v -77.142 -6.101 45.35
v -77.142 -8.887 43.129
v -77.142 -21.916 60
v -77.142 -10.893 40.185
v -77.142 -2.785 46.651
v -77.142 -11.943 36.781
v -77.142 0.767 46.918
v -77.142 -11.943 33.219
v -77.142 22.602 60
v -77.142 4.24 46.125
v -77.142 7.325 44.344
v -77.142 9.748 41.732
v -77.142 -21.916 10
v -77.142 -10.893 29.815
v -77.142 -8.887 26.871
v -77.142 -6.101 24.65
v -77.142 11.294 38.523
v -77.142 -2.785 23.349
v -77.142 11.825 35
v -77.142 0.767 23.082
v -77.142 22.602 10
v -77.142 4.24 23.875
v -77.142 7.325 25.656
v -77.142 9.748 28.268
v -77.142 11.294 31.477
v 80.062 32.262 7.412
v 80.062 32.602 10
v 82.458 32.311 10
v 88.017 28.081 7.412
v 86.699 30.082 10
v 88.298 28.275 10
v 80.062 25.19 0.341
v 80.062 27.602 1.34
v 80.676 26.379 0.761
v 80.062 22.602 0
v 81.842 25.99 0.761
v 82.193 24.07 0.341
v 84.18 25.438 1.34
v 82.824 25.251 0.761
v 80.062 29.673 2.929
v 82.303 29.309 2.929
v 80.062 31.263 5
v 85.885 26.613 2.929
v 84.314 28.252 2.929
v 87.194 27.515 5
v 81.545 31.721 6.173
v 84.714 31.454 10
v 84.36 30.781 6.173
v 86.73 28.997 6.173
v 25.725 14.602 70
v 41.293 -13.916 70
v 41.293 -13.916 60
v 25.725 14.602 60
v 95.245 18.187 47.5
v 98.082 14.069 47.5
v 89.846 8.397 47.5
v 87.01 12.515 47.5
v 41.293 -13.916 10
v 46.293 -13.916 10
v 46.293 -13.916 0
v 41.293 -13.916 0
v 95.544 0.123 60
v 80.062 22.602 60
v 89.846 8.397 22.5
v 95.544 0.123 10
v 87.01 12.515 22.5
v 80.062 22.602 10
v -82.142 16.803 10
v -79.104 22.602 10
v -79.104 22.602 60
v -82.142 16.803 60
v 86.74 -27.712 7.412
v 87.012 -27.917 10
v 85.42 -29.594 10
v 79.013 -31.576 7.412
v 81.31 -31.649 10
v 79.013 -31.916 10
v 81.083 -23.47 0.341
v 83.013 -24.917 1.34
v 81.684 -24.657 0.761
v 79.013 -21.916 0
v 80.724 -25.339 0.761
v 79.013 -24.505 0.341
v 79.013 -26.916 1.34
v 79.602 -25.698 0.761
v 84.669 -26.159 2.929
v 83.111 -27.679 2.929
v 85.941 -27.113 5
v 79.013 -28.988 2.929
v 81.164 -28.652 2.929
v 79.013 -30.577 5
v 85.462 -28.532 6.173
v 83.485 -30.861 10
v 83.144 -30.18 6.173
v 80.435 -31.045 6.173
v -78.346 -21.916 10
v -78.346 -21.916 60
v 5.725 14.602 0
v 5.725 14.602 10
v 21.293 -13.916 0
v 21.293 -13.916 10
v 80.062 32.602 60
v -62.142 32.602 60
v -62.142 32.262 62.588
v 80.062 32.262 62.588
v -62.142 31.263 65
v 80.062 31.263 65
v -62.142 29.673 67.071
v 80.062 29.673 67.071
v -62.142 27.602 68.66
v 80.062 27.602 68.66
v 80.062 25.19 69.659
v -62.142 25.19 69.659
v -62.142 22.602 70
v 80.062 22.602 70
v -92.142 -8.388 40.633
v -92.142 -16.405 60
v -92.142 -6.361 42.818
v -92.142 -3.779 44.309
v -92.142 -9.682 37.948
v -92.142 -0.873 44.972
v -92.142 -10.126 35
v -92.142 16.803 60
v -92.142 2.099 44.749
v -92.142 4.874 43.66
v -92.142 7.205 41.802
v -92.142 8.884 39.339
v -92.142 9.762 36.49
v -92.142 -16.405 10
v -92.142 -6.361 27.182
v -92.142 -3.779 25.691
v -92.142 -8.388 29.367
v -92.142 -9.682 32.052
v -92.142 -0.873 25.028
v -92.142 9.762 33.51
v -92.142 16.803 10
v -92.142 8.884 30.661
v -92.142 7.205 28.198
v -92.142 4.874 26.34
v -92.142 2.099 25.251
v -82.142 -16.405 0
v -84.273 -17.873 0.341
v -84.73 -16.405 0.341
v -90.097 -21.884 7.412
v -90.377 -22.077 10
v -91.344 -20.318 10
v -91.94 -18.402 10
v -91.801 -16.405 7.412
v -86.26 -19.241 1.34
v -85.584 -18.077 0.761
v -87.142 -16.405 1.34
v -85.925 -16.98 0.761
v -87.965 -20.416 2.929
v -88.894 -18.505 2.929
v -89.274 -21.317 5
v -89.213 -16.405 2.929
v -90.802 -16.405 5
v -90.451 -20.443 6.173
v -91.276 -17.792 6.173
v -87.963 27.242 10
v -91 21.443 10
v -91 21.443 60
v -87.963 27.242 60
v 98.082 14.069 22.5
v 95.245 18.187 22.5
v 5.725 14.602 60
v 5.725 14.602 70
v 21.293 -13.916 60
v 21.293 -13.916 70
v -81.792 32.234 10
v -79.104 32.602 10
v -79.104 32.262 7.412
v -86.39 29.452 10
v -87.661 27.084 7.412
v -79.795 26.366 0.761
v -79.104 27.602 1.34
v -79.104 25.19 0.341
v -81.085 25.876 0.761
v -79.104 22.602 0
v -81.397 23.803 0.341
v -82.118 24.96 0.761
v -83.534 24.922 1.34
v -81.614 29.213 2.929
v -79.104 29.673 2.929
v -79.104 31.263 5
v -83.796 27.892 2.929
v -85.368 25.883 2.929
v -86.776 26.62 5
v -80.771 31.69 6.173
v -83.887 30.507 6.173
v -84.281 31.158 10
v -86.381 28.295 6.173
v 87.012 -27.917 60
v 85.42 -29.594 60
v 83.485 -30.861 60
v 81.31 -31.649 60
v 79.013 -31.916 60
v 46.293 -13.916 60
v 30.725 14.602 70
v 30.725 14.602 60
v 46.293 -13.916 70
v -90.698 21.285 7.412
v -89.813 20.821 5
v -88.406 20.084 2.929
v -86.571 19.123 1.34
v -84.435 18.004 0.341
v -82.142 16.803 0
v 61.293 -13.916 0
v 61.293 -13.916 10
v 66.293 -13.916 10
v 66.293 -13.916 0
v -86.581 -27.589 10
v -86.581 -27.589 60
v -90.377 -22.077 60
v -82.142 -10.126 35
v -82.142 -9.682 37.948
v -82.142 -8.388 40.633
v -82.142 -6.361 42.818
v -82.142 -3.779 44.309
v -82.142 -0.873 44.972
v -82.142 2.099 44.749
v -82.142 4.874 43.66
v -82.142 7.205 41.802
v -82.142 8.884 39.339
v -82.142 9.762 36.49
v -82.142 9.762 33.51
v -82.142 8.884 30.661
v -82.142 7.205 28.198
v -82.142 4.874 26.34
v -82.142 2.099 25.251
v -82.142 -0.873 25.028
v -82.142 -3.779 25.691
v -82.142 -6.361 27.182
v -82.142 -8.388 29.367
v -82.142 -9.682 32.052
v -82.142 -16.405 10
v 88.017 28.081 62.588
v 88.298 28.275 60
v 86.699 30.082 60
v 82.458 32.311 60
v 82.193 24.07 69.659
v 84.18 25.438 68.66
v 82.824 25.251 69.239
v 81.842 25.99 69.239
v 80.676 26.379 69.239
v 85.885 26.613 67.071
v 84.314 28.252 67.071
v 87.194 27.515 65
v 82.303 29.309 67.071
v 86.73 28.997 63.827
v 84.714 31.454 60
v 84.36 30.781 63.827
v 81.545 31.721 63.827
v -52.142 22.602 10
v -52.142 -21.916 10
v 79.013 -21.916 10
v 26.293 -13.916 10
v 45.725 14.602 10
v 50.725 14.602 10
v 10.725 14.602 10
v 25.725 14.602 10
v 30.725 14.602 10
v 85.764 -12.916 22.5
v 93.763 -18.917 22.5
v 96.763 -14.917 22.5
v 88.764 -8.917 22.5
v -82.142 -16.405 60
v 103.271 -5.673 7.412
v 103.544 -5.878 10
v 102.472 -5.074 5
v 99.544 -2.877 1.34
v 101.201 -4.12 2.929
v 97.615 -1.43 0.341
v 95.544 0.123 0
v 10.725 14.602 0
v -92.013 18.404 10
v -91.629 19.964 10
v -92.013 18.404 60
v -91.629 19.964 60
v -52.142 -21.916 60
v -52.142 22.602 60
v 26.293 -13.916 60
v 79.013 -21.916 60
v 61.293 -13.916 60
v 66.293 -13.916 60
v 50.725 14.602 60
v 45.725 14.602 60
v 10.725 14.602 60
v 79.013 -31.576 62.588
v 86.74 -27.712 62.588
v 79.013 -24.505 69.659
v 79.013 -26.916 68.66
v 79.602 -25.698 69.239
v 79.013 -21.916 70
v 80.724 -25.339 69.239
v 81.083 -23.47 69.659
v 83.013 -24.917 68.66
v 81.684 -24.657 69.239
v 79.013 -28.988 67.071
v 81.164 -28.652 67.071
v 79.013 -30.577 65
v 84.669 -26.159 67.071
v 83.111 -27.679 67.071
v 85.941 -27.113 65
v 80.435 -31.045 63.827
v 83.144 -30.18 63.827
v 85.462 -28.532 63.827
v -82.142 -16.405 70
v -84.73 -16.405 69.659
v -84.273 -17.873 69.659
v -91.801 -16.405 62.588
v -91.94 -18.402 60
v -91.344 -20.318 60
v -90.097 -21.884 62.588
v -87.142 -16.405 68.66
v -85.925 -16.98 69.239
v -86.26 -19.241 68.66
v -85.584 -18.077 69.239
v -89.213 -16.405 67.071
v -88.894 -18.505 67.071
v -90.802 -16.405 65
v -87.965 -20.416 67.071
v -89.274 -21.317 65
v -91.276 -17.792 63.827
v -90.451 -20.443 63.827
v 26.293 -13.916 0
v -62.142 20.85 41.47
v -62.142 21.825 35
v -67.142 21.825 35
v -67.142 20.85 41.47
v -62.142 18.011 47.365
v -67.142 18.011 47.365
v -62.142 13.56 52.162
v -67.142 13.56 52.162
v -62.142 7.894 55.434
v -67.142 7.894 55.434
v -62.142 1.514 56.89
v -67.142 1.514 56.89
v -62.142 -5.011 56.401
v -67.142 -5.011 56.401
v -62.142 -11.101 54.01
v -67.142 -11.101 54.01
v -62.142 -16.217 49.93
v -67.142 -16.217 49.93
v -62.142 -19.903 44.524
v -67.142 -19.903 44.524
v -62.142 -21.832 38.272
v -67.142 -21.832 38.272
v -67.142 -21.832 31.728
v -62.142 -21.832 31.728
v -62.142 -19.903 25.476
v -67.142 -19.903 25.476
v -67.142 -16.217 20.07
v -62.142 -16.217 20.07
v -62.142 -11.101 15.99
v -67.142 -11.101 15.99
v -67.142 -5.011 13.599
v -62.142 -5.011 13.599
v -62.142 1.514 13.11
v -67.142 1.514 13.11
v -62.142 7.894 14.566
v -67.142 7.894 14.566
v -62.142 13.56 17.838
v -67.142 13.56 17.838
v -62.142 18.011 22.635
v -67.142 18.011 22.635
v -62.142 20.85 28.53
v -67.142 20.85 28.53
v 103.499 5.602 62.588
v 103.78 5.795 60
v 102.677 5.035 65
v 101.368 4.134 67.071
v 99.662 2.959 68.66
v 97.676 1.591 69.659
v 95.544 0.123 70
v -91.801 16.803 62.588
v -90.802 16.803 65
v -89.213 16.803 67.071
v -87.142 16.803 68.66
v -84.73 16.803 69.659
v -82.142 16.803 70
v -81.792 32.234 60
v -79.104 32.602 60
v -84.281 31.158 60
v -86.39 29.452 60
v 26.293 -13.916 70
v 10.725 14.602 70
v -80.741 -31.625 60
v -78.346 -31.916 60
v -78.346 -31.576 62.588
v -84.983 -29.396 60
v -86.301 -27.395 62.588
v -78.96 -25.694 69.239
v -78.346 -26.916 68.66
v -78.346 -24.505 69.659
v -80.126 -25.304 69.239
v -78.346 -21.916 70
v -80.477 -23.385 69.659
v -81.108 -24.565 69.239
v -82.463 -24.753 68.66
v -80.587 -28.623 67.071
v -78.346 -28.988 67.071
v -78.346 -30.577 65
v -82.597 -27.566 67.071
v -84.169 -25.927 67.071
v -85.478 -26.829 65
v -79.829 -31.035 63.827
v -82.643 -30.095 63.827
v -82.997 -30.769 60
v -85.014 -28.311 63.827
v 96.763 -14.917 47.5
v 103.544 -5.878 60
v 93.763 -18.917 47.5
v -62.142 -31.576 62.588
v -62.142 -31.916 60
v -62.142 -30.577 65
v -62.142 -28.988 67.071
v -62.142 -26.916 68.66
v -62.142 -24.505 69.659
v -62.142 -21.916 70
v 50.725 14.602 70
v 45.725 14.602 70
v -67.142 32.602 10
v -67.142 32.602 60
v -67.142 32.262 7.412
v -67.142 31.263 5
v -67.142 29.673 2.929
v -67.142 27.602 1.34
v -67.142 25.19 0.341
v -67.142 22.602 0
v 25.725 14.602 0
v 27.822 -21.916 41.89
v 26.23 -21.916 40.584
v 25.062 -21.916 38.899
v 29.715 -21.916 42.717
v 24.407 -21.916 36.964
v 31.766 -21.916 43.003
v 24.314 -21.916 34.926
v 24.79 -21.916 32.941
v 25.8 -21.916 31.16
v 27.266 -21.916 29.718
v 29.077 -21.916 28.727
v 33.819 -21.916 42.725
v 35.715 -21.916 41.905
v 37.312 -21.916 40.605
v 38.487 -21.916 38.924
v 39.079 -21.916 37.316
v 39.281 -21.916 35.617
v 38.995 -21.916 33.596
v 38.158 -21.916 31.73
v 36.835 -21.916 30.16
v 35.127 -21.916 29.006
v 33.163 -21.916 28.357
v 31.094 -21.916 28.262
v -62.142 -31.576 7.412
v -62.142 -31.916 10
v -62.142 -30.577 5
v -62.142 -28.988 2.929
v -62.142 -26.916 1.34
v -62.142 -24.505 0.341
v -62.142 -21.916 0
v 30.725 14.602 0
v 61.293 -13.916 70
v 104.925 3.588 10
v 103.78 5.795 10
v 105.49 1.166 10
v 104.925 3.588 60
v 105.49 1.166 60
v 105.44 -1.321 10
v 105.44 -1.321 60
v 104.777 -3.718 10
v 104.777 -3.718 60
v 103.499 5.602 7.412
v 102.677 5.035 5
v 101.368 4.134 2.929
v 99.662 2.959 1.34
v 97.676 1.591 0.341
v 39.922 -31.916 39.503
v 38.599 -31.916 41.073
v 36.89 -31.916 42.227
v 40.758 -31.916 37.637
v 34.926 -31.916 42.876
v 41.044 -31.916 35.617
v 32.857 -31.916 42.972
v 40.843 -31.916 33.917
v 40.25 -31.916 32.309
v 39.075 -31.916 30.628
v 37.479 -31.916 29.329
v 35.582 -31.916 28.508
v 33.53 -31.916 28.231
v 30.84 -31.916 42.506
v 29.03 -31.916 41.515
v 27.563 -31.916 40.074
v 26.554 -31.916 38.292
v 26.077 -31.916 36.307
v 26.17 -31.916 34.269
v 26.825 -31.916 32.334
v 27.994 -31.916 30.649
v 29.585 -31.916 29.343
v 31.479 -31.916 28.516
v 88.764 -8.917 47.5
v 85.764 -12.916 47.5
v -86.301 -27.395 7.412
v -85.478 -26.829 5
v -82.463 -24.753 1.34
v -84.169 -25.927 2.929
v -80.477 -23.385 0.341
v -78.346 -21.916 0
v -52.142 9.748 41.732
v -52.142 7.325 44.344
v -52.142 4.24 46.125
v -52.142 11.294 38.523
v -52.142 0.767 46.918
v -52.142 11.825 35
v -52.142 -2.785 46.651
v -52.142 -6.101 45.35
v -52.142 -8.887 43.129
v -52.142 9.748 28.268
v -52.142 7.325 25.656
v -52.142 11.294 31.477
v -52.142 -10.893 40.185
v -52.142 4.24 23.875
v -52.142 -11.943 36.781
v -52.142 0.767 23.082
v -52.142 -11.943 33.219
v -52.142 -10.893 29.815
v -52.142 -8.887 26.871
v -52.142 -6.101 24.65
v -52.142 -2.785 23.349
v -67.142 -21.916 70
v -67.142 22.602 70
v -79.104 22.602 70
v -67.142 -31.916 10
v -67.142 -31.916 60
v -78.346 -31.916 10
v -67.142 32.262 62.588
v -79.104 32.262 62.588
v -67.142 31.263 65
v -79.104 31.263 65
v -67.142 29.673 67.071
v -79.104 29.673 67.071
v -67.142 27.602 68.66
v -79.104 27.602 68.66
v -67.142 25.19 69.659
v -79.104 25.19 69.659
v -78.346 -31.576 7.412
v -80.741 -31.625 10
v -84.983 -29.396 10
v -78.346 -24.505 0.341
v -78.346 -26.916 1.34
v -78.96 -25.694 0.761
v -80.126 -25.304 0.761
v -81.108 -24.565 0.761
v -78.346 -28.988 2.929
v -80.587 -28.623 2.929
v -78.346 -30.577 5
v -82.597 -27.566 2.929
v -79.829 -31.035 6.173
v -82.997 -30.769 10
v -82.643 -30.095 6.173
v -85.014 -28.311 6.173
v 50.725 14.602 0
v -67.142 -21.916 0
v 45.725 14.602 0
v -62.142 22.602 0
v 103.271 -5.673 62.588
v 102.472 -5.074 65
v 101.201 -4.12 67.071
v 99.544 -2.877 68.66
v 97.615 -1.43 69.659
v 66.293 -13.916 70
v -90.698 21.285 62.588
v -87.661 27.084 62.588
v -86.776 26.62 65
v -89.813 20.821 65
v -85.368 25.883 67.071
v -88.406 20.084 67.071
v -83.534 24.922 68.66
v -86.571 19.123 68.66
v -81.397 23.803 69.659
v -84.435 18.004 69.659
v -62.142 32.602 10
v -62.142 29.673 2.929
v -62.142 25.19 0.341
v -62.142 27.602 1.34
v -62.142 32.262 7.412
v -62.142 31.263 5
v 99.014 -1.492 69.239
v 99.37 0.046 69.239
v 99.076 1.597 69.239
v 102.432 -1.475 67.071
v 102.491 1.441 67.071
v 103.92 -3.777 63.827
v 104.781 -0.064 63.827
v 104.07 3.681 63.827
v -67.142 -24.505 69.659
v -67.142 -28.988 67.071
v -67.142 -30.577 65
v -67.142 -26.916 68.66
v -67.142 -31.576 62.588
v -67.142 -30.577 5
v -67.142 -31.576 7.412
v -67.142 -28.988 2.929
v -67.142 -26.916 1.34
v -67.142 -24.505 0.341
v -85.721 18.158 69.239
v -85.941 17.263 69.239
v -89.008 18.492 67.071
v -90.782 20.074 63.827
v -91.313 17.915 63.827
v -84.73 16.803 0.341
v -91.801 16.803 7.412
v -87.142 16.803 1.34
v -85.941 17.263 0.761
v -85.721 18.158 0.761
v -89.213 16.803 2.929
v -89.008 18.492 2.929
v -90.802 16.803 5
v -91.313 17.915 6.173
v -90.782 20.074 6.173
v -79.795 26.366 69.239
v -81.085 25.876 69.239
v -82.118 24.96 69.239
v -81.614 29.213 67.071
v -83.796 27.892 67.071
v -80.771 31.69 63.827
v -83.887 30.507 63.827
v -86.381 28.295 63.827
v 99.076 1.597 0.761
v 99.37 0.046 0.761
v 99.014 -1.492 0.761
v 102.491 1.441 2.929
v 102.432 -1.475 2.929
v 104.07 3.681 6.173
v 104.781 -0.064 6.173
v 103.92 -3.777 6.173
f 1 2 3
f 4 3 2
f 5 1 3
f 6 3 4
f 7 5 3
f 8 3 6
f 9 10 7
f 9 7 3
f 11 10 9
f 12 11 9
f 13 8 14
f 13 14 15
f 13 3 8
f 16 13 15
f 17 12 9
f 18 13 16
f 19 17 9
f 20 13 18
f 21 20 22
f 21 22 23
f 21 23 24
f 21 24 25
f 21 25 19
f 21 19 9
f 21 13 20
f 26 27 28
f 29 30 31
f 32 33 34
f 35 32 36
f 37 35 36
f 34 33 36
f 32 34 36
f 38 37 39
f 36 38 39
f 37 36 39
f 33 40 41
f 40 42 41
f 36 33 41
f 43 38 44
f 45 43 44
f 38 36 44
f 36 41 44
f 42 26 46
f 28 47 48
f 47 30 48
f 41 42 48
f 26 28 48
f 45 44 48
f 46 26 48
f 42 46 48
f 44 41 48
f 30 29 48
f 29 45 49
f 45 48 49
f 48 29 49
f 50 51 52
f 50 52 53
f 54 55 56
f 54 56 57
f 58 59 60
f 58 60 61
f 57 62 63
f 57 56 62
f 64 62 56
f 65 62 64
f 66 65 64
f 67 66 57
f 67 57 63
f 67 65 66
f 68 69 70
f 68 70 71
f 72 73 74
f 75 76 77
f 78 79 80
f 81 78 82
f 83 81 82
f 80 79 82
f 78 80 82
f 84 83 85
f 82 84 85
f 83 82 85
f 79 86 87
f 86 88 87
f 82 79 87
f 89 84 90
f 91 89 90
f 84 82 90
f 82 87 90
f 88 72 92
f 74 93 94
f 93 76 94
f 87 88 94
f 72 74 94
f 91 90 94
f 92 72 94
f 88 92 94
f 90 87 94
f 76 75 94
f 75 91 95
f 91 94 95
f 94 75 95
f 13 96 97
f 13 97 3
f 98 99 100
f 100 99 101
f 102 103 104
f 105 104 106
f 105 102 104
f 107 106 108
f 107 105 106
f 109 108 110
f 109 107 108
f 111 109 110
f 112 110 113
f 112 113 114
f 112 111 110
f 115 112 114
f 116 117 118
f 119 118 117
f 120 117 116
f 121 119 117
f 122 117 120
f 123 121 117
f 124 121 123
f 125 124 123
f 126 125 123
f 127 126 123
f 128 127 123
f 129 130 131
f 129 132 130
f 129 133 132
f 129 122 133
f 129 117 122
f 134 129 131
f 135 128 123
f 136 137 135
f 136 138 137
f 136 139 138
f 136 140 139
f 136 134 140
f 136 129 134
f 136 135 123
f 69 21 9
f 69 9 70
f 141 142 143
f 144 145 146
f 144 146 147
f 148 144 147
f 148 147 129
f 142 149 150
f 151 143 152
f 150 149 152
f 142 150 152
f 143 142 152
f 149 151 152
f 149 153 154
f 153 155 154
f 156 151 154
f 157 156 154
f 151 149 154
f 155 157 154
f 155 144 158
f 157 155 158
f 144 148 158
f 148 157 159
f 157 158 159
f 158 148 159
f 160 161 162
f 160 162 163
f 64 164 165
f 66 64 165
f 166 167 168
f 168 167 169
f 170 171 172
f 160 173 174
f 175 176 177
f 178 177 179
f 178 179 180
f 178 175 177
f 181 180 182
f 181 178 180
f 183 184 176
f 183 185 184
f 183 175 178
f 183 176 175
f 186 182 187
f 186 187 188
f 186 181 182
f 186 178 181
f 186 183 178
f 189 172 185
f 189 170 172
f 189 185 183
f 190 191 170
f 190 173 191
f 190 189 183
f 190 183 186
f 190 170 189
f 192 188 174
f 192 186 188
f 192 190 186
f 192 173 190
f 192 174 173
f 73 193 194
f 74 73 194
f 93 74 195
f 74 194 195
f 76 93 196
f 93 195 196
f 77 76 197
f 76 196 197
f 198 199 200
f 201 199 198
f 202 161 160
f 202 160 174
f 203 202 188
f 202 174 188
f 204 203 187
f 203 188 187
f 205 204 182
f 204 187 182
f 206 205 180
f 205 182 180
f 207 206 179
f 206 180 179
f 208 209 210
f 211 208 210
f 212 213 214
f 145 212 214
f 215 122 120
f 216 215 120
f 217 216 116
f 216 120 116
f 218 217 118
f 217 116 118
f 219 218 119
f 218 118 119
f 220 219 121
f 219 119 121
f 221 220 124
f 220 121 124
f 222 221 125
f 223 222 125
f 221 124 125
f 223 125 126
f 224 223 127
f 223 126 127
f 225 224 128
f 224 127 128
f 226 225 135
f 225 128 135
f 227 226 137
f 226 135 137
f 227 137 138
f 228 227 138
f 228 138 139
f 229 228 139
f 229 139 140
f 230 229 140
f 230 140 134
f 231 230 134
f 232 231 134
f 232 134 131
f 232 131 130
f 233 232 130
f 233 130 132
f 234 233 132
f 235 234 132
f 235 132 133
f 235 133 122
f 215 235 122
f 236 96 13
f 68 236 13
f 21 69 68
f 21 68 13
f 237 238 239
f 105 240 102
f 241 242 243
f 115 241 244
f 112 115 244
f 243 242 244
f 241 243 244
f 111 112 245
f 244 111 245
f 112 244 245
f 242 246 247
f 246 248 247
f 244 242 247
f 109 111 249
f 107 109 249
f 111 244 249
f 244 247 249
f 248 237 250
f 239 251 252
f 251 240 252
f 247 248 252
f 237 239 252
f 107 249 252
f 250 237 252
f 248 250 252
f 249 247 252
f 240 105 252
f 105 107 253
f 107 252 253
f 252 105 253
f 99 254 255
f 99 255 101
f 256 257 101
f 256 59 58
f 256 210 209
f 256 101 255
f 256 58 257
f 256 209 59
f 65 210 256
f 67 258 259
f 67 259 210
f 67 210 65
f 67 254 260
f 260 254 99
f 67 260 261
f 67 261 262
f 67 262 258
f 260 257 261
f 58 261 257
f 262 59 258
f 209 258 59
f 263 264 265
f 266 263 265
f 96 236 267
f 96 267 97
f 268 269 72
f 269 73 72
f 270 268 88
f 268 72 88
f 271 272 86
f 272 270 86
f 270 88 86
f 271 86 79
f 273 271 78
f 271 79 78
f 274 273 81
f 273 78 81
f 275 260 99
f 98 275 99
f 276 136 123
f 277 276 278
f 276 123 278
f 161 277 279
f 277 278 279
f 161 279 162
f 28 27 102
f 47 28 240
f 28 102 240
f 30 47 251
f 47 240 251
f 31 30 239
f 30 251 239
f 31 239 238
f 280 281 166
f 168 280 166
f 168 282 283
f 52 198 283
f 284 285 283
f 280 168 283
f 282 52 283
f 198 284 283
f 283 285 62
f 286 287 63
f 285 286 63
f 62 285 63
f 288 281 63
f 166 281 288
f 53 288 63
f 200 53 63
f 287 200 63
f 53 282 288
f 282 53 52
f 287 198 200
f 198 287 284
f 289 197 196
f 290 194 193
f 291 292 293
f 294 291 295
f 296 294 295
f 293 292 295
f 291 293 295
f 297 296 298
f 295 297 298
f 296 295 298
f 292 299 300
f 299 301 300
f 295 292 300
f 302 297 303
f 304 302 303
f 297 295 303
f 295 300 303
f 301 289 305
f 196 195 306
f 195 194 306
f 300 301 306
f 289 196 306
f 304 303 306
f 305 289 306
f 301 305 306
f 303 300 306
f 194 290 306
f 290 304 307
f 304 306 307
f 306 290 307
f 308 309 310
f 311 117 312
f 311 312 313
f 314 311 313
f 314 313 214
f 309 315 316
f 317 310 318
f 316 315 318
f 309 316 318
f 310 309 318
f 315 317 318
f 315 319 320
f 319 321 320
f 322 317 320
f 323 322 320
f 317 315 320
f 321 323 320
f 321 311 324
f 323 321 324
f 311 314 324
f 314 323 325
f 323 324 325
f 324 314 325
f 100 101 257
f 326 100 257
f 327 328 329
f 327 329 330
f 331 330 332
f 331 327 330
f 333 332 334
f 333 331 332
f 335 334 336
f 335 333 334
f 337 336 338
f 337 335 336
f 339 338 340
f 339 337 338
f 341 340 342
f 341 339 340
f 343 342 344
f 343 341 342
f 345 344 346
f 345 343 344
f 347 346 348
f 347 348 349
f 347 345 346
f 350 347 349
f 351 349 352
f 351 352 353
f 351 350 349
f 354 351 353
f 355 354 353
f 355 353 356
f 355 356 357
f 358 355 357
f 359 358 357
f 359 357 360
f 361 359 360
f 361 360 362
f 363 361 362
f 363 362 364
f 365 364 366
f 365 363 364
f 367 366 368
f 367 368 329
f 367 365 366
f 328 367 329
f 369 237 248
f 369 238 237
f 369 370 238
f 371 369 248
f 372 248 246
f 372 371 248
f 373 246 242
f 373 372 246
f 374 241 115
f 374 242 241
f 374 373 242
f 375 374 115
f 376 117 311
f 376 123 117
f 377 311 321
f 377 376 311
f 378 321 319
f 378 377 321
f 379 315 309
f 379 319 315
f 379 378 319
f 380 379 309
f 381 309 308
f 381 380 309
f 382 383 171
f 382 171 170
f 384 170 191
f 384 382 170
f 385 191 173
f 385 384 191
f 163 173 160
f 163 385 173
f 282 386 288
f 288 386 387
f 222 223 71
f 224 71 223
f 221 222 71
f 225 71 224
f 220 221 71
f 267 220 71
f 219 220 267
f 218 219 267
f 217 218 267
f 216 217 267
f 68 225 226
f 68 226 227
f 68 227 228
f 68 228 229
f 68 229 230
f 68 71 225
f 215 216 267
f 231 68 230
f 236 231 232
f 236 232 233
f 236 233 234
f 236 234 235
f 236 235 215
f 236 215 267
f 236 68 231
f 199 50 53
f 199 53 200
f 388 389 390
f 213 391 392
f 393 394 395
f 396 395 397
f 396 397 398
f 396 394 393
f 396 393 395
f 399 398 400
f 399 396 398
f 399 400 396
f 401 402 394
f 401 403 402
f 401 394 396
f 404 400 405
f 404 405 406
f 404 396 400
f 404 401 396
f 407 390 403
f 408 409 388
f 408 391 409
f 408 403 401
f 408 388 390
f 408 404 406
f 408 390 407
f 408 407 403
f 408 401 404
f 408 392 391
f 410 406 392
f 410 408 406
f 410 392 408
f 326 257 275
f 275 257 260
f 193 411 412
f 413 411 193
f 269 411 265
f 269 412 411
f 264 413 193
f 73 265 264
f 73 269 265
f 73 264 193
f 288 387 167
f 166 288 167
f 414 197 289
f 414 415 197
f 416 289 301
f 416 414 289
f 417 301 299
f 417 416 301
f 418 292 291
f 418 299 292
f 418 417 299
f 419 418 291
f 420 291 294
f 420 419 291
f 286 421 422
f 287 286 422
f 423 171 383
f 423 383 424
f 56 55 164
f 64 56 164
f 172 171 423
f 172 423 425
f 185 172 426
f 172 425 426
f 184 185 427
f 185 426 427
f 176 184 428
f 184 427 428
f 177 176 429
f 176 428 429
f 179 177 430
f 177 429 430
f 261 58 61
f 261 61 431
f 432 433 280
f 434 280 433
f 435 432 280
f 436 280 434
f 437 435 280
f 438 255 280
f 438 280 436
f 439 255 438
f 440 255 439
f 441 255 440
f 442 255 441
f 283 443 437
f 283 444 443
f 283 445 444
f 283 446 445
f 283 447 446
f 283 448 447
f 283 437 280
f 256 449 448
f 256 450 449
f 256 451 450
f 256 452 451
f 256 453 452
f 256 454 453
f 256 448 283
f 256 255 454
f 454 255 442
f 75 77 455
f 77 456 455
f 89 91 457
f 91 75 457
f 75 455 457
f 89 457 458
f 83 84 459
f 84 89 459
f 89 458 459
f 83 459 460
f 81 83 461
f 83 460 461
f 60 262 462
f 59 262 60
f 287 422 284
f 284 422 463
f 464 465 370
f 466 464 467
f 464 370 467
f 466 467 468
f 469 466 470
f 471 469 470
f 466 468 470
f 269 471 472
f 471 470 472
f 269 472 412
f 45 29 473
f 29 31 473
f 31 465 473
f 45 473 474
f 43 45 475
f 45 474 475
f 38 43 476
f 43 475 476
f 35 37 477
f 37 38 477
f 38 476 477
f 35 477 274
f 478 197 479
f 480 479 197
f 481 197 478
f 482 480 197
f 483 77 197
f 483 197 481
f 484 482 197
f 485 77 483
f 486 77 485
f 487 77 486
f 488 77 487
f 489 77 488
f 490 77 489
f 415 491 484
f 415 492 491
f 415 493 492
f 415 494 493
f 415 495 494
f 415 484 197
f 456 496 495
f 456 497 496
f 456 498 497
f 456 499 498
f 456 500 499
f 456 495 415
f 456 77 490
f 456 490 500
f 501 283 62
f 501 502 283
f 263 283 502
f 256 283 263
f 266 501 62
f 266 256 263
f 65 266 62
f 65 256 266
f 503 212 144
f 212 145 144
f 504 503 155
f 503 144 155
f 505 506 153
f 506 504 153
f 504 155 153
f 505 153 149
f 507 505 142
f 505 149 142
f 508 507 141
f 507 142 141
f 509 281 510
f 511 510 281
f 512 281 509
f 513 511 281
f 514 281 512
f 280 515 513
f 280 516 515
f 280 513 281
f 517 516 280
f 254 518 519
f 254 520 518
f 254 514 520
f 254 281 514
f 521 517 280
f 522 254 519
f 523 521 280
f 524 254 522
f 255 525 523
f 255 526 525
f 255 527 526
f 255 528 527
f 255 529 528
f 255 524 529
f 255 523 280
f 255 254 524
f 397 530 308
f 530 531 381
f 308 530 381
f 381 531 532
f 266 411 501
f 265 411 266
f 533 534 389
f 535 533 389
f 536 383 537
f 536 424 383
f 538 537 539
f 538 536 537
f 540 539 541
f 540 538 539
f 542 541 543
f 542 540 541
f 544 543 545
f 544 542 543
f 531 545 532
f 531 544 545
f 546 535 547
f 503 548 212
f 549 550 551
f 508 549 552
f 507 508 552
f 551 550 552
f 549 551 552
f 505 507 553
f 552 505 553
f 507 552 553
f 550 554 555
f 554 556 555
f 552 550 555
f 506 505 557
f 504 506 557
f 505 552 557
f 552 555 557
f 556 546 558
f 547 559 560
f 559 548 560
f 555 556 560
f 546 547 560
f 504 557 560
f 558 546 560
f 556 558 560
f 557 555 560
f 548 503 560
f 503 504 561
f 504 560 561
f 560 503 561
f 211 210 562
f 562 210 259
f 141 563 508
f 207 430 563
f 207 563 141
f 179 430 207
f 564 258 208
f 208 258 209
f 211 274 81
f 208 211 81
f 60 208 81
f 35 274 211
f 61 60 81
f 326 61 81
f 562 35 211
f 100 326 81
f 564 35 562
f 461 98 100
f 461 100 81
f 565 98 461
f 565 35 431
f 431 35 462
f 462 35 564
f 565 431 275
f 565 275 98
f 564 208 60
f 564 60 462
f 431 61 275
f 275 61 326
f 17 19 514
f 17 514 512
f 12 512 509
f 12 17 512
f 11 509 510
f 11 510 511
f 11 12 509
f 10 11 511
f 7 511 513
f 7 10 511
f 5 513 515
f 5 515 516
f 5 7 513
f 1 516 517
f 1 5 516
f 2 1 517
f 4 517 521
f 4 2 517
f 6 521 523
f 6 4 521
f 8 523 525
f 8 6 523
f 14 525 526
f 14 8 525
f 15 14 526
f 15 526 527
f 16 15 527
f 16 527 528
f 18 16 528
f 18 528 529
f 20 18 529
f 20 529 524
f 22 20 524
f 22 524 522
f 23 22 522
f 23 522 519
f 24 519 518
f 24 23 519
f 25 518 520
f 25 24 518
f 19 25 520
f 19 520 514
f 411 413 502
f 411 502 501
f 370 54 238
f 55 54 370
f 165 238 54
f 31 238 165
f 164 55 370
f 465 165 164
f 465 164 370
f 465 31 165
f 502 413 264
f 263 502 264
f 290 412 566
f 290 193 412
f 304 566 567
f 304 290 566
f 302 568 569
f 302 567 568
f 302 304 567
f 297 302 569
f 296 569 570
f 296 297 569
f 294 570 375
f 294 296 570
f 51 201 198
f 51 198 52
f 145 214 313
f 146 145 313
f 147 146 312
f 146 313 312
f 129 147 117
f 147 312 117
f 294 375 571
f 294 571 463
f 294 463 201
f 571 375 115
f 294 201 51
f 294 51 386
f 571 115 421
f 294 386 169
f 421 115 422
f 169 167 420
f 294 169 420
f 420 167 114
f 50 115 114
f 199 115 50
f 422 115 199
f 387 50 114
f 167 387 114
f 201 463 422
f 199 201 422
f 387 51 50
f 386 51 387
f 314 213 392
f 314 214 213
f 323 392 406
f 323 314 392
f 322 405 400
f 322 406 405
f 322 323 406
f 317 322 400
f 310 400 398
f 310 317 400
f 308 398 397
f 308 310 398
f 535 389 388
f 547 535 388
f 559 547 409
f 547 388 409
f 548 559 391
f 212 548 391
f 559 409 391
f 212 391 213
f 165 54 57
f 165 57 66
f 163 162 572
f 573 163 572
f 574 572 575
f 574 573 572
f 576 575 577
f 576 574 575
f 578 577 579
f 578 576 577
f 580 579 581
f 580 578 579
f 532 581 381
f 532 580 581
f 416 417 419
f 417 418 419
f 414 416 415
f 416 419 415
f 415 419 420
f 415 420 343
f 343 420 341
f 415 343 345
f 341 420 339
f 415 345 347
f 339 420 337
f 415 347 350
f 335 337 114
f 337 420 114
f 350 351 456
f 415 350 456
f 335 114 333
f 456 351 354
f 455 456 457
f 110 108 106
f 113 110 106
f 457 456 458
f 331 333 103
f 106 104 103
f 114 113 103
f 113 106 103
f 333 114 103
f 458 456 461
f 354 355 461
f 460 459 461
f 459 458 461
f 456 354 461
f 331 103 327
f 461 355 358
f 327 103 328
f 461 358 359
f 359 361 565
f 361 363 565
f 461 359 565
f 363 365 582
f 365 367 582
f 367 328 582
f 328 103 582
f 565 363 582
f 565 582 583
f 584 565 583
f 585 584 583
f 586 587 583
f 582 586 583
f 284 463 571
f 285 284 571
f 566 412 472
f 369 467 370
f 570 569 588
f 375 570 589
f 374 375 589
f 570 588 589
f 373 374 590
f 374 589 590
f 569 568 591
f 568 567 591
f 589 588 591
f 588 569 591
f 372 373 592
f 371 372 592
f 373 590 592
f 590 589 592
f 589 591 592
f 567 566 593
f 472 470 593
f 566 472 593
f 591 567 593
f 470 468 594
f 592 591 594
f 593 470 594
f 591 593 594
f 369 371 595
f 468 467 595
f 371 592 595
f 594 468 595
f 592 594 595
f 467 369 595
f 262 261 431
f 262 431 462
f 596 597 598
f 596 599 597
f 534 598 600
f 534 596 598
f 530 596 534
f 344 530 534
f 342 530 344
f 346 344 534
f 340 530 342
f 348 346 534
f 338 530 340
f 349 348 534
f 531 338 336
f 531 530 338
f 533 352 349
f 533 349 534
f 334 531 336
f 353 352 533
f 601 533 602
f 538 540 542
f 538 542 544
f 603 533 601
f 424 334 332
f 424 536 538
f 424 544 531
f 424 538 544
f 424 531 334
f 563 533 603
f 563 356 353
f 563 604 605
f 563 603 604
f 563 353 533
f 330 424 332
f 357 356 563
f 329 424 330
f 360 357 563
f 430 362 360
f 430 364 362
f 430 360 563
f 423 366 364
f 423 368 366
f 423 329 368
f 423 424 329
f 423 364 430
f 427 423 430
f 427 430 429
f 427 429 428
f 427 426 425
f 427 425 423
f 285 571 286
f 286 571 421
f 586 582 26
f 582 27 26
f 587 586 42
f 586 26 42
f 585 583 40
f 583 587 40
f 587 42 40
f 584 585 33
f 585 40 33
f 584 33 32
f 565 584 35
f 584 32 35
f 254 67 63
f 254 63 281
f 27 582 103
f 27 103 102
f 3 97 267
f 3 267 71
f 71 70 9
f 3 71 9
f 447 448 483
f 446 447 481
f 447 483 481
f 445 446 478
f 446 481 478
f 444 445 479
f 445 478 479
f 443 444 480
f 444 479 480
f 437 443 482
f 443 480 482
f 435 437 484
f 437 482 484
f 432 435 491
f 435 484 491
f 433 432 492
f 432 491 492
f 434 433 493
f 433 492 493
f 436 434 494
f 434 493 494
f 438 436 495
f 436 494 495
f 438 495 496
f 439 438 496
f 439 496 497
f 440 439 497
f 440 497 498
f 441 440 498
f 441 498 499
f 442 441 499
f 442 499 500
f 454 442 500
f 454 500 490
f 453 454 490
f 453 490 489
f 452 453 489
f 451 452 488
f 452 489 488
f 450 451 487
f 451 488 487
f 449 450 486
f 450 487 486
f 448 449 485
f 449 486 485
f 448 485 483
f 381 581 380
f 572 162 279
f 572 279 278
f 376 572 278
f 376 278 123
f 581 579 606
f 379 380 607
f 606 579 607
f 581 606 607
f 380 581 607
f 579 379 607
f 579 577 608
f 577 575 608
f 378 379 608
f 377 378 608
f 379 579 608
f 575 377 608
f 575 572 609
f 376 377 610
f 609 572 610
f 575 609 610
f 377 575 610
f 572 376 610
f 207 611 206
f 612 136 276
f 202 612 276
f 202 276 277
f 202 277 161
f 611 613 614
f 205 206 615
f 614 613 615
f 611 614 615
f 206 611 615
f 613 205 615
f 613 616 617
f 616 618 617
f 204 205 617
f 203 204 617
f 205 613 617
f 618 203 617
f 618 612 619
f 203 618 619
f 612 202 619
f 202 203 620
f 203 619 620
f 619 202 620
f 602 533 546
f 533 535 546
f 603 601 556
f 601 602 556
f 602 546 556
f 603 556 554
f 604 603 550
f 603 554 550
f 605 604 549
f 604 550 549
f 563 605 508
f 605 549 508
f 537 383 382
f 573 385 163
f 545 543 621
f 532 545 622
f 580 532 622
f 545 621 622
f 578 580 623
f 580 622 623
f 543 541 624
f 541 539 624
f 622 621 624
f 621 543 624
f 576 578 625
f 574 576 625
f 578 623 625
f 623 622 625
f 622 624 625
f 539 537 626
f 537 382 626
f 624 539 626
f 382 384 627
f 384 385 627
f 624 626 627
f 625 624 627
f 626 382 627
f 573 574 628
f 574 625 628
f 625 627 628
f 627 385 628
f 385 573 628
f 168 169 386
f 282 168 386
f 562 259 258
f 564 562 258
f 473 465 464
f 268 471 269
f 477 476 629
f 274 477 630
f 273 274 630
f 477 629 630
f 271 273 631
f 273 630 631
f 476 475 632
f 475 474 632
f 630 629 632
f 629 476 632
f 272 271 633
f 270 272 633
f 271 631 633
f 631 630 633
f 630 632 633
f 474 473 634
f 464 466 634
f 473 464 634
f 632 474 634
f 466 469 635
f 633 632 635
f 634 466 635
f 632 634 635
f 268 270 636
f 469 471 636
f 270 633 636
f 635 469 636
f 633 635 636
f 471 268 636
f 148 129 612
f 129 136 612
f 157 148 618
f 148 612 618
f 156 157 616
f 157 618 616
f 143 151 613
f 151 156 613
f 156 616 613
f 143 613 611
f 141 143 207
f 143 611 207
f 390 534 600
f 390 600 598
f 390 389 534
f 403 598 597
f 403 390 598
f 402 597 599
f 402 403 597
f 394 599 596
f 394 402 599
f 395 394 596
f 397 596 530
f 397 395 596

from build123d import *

# Parameters (mm, degrees)
BOSS_EXTRUDE1_DEPTH = 70
FILLET1_R           = 10
SKETCH4_R           = 44.565838739
SKETCH4_R_2         = 21.950927137
CUT_EXTRUDE18_DEPTH = 5
SHELL2_START        = 10
SHELL2_DEPTH        = 50
SHELL2_START_2      = -77.141831355
SHELL2_2_OUTLINE_R  = 11.950927137
SHELL2_2_DEPTH      = 25
SKETCH2_R           = 10
CUT_EXTRUDE19_DEPTH = 30
SKETCH10_R          = 7.386058148
CUT_EXTRUDE22_DEPTH = 33
CUT_EXTRUDE23_DEPTH = 131.776604246
SKETCH16_W          = 25
SKETCH16_H          = 5
CUT_EXTRUDE25_DEPTH = 16.122153735
SKETCH17_W          = 25
SKETCH17_H          = 5
CUT_EXTRUDE26_DEPTH = 16.122153735


with BuildPart() as part:
    # Sketch1 → Boss-Extrude1 (new body)
    with BuildSketch(Plane.XY):
        Polygon((-85.15522278, 32.602281584), (85.31682344, 32.602281584), (107.858168645, -0.126017705), (84.012402994, -31.916476628), (-83.600577489, -31.916476628), (-92.141831355, -19.515233034), (-92.141831355, 19.263197625), align=None)
    extrude(amount=BOSS_EXTRUDE1_DEPTH)

    # Fillet1
    fillet1_edges = [part.edges().sort_by_distance(p)[0] for p in [
        (-88.648527067, 25.932739604, 0),
        (-85.15522278, 32.602281584, 35),
        (85.31682344, 32.602281584, 35),
        (107.858168645, -0.126017705, 35),
        (-87.871204422, -25.715854831, 70),
        (84.012402994, -31.916476628, 35),
        (-83.600577489, -31.916476628, 35),
        (-92.141831355, -19.515233034, 35),
        (-92.141831355, 19.263197625, 35),
        (0.205912752, -31.916476628, 70),
        (95.93528582, -16.021247166, 70),
        (96.587496042, 16.23813194, 70),
        (0.08080033, 32.602281584, 70),
        (-88.648527067, 25.932739604, 70),
        (0.08080033, 32.602281584, 0),
        (96.587496042, 16.23813194, 0),
        (95.93528582, -16.021247166, 0),
        (0.205912752, -31.916476628, 0),
        (-92.141831355, -0.126017705, 70),
        (-87.871204422, -25.715854831, 0),
        (-92.141831355, -0.126017705, 0),
    ]]
    fillet(fillet1_edges, radius=FILLET1_R)

    # Sketch4 → Cut-Extrude18 (cut)
    with BuildSketch(Plane(origin=(-62.141831355, 0, 0), x_dir=(0, 0, -1), z_dir=(1, 0, 0))):
        with Locations((-35, -0.126017705)):
            Circle(SKETCH4_R)
        with Locations(Location((-35, -0.126017705, 0), (0, 0, 90))):
            Circle(SKETCH4_R_2, mode=Mode.SUBTRACT)
    extrude(amount=-CUT_EXTRUDE18_DEPTH, mode=Mode.SUBTRACT)

    # Shell2: read off the stored shape, not the designer's step
    # Shell2 outline → Shell2 (cut)
    with BuildSketch(Plane.XY.offset(SHELL2_START)):
        Polygon((-78.345650785, -21.916476628), (-77.141831355, -21.916476628), (-77.141831355, 22.602281584), (-79.104276607, 22.602281584), (-82.141831355, 16.80287299), (-82.141831355, -16.404714454), align=None)
        Polygon((-52.141831355, -21.916476628), (79.012770562, -21.916476628), (95.544357754, 0.122939143), (80.061896735, 22.602281584), (-52.141831355, 22.602281584), align=None)
    extrude(amount=SHELL2_DEPTH, mode=Mode.SUBTRACT)

    # Shell2 2 outline → Shell2 2 (cut)
    with BuildSketch(Plane.YZ.offset(SHELL2_START_2)):
        with Locations((-0.126017705, 35)):
            Circle(SHELL2_2_OUTLINE_R)
    extrude(amount=SHELL2_2_DEPTH, mode=Mode.SUBTRACT)

    # Sketch2 → Cut-Extrude19 (cut)
    with BuildSketch(Plane.ZY.offset(92.141831355)):
        with Locations(Location((35, -0.126017705, 0), (0, 0, 270))):
            Circle(SKETCH2_R)
    extrude(amount=-CUT_EXTRUDE19_DEPTH, mode=Mode.SUBTRACT)

    # Sketch10 → Cut-Extrude22 (cut)
    with BuildSketch(Plane(origin=(7.840565514, -44.466056654, 0), x_dir=(0, 0, 1), z_dir=(0.17364817766693072, -0.984807753012208, 0))):
        with Locations(Location((35.616590305, -27.492158059, 0), (0, 0, 270))):
            Circle(SKETCH10_R)
    extrude(amount=-CUT_EXTRUDE22_DEPTH, mode=Mode.SUBTRACT)

    # Sketch11 → Cut-Extrude23 (cut, through all)
    with BuildSketch(Plane.XY.offset(70)):
        Polygon((25.724647203, 14.602281584), (30.724647203, 14.602281584), (46.292543401, -13.916476628), (41.292543401, -13.916476628), align=None)
        Polygon((21.292543401, -13.916476628), (26.292543401, -13.916476628), (10.724647203, 14.602281584), (5.724647203, 14.602281584), align=None)
        Polygon((45.724647203, 14.602281584), (61.292543401, -13.916476628), (66.292543401, -13.916476628), (50.724647203, 14.602281584), align=None)
    extrude(amount=-CUT_EXTRUDE23_DEPTH, mode=Mode.SUBTRACT)

    # Sketch16 → Cut-Extrude25 (cut)
    with BuildSketch(Plane(origin=(73.09679987, 50.344815805, 0), x_dir=(0, 0, -1), z_dir=(0.8235642198480575, 0.5672230388357482, 0))):
        with Locations((-35, -41.547421266)):
            Rectangle(SKETCH16_W, SKETCH16_H)
    extrude(amount=-CUT_EXTRUDE25_DEPTH, mode=Mode.SUBTRACT)

    # Sketch17 → Cut-Extrude26 (cut)
    with BuildSketch(Plane(origin=(69.08362881, -51.819070211, 0), x_dir=(0, 0, -1), z_dir=(0.7999647115864142, -0.600047048335766, 0))):
        with Locations((-35, 43.629456832)):
            Rectangle(SKETCH17_W, SKETCH17_H)
    extrude(amount=-CUT_EXTRUDE26_DEPTH, mode=Mode.SUBTRACT)


solid = part.part
